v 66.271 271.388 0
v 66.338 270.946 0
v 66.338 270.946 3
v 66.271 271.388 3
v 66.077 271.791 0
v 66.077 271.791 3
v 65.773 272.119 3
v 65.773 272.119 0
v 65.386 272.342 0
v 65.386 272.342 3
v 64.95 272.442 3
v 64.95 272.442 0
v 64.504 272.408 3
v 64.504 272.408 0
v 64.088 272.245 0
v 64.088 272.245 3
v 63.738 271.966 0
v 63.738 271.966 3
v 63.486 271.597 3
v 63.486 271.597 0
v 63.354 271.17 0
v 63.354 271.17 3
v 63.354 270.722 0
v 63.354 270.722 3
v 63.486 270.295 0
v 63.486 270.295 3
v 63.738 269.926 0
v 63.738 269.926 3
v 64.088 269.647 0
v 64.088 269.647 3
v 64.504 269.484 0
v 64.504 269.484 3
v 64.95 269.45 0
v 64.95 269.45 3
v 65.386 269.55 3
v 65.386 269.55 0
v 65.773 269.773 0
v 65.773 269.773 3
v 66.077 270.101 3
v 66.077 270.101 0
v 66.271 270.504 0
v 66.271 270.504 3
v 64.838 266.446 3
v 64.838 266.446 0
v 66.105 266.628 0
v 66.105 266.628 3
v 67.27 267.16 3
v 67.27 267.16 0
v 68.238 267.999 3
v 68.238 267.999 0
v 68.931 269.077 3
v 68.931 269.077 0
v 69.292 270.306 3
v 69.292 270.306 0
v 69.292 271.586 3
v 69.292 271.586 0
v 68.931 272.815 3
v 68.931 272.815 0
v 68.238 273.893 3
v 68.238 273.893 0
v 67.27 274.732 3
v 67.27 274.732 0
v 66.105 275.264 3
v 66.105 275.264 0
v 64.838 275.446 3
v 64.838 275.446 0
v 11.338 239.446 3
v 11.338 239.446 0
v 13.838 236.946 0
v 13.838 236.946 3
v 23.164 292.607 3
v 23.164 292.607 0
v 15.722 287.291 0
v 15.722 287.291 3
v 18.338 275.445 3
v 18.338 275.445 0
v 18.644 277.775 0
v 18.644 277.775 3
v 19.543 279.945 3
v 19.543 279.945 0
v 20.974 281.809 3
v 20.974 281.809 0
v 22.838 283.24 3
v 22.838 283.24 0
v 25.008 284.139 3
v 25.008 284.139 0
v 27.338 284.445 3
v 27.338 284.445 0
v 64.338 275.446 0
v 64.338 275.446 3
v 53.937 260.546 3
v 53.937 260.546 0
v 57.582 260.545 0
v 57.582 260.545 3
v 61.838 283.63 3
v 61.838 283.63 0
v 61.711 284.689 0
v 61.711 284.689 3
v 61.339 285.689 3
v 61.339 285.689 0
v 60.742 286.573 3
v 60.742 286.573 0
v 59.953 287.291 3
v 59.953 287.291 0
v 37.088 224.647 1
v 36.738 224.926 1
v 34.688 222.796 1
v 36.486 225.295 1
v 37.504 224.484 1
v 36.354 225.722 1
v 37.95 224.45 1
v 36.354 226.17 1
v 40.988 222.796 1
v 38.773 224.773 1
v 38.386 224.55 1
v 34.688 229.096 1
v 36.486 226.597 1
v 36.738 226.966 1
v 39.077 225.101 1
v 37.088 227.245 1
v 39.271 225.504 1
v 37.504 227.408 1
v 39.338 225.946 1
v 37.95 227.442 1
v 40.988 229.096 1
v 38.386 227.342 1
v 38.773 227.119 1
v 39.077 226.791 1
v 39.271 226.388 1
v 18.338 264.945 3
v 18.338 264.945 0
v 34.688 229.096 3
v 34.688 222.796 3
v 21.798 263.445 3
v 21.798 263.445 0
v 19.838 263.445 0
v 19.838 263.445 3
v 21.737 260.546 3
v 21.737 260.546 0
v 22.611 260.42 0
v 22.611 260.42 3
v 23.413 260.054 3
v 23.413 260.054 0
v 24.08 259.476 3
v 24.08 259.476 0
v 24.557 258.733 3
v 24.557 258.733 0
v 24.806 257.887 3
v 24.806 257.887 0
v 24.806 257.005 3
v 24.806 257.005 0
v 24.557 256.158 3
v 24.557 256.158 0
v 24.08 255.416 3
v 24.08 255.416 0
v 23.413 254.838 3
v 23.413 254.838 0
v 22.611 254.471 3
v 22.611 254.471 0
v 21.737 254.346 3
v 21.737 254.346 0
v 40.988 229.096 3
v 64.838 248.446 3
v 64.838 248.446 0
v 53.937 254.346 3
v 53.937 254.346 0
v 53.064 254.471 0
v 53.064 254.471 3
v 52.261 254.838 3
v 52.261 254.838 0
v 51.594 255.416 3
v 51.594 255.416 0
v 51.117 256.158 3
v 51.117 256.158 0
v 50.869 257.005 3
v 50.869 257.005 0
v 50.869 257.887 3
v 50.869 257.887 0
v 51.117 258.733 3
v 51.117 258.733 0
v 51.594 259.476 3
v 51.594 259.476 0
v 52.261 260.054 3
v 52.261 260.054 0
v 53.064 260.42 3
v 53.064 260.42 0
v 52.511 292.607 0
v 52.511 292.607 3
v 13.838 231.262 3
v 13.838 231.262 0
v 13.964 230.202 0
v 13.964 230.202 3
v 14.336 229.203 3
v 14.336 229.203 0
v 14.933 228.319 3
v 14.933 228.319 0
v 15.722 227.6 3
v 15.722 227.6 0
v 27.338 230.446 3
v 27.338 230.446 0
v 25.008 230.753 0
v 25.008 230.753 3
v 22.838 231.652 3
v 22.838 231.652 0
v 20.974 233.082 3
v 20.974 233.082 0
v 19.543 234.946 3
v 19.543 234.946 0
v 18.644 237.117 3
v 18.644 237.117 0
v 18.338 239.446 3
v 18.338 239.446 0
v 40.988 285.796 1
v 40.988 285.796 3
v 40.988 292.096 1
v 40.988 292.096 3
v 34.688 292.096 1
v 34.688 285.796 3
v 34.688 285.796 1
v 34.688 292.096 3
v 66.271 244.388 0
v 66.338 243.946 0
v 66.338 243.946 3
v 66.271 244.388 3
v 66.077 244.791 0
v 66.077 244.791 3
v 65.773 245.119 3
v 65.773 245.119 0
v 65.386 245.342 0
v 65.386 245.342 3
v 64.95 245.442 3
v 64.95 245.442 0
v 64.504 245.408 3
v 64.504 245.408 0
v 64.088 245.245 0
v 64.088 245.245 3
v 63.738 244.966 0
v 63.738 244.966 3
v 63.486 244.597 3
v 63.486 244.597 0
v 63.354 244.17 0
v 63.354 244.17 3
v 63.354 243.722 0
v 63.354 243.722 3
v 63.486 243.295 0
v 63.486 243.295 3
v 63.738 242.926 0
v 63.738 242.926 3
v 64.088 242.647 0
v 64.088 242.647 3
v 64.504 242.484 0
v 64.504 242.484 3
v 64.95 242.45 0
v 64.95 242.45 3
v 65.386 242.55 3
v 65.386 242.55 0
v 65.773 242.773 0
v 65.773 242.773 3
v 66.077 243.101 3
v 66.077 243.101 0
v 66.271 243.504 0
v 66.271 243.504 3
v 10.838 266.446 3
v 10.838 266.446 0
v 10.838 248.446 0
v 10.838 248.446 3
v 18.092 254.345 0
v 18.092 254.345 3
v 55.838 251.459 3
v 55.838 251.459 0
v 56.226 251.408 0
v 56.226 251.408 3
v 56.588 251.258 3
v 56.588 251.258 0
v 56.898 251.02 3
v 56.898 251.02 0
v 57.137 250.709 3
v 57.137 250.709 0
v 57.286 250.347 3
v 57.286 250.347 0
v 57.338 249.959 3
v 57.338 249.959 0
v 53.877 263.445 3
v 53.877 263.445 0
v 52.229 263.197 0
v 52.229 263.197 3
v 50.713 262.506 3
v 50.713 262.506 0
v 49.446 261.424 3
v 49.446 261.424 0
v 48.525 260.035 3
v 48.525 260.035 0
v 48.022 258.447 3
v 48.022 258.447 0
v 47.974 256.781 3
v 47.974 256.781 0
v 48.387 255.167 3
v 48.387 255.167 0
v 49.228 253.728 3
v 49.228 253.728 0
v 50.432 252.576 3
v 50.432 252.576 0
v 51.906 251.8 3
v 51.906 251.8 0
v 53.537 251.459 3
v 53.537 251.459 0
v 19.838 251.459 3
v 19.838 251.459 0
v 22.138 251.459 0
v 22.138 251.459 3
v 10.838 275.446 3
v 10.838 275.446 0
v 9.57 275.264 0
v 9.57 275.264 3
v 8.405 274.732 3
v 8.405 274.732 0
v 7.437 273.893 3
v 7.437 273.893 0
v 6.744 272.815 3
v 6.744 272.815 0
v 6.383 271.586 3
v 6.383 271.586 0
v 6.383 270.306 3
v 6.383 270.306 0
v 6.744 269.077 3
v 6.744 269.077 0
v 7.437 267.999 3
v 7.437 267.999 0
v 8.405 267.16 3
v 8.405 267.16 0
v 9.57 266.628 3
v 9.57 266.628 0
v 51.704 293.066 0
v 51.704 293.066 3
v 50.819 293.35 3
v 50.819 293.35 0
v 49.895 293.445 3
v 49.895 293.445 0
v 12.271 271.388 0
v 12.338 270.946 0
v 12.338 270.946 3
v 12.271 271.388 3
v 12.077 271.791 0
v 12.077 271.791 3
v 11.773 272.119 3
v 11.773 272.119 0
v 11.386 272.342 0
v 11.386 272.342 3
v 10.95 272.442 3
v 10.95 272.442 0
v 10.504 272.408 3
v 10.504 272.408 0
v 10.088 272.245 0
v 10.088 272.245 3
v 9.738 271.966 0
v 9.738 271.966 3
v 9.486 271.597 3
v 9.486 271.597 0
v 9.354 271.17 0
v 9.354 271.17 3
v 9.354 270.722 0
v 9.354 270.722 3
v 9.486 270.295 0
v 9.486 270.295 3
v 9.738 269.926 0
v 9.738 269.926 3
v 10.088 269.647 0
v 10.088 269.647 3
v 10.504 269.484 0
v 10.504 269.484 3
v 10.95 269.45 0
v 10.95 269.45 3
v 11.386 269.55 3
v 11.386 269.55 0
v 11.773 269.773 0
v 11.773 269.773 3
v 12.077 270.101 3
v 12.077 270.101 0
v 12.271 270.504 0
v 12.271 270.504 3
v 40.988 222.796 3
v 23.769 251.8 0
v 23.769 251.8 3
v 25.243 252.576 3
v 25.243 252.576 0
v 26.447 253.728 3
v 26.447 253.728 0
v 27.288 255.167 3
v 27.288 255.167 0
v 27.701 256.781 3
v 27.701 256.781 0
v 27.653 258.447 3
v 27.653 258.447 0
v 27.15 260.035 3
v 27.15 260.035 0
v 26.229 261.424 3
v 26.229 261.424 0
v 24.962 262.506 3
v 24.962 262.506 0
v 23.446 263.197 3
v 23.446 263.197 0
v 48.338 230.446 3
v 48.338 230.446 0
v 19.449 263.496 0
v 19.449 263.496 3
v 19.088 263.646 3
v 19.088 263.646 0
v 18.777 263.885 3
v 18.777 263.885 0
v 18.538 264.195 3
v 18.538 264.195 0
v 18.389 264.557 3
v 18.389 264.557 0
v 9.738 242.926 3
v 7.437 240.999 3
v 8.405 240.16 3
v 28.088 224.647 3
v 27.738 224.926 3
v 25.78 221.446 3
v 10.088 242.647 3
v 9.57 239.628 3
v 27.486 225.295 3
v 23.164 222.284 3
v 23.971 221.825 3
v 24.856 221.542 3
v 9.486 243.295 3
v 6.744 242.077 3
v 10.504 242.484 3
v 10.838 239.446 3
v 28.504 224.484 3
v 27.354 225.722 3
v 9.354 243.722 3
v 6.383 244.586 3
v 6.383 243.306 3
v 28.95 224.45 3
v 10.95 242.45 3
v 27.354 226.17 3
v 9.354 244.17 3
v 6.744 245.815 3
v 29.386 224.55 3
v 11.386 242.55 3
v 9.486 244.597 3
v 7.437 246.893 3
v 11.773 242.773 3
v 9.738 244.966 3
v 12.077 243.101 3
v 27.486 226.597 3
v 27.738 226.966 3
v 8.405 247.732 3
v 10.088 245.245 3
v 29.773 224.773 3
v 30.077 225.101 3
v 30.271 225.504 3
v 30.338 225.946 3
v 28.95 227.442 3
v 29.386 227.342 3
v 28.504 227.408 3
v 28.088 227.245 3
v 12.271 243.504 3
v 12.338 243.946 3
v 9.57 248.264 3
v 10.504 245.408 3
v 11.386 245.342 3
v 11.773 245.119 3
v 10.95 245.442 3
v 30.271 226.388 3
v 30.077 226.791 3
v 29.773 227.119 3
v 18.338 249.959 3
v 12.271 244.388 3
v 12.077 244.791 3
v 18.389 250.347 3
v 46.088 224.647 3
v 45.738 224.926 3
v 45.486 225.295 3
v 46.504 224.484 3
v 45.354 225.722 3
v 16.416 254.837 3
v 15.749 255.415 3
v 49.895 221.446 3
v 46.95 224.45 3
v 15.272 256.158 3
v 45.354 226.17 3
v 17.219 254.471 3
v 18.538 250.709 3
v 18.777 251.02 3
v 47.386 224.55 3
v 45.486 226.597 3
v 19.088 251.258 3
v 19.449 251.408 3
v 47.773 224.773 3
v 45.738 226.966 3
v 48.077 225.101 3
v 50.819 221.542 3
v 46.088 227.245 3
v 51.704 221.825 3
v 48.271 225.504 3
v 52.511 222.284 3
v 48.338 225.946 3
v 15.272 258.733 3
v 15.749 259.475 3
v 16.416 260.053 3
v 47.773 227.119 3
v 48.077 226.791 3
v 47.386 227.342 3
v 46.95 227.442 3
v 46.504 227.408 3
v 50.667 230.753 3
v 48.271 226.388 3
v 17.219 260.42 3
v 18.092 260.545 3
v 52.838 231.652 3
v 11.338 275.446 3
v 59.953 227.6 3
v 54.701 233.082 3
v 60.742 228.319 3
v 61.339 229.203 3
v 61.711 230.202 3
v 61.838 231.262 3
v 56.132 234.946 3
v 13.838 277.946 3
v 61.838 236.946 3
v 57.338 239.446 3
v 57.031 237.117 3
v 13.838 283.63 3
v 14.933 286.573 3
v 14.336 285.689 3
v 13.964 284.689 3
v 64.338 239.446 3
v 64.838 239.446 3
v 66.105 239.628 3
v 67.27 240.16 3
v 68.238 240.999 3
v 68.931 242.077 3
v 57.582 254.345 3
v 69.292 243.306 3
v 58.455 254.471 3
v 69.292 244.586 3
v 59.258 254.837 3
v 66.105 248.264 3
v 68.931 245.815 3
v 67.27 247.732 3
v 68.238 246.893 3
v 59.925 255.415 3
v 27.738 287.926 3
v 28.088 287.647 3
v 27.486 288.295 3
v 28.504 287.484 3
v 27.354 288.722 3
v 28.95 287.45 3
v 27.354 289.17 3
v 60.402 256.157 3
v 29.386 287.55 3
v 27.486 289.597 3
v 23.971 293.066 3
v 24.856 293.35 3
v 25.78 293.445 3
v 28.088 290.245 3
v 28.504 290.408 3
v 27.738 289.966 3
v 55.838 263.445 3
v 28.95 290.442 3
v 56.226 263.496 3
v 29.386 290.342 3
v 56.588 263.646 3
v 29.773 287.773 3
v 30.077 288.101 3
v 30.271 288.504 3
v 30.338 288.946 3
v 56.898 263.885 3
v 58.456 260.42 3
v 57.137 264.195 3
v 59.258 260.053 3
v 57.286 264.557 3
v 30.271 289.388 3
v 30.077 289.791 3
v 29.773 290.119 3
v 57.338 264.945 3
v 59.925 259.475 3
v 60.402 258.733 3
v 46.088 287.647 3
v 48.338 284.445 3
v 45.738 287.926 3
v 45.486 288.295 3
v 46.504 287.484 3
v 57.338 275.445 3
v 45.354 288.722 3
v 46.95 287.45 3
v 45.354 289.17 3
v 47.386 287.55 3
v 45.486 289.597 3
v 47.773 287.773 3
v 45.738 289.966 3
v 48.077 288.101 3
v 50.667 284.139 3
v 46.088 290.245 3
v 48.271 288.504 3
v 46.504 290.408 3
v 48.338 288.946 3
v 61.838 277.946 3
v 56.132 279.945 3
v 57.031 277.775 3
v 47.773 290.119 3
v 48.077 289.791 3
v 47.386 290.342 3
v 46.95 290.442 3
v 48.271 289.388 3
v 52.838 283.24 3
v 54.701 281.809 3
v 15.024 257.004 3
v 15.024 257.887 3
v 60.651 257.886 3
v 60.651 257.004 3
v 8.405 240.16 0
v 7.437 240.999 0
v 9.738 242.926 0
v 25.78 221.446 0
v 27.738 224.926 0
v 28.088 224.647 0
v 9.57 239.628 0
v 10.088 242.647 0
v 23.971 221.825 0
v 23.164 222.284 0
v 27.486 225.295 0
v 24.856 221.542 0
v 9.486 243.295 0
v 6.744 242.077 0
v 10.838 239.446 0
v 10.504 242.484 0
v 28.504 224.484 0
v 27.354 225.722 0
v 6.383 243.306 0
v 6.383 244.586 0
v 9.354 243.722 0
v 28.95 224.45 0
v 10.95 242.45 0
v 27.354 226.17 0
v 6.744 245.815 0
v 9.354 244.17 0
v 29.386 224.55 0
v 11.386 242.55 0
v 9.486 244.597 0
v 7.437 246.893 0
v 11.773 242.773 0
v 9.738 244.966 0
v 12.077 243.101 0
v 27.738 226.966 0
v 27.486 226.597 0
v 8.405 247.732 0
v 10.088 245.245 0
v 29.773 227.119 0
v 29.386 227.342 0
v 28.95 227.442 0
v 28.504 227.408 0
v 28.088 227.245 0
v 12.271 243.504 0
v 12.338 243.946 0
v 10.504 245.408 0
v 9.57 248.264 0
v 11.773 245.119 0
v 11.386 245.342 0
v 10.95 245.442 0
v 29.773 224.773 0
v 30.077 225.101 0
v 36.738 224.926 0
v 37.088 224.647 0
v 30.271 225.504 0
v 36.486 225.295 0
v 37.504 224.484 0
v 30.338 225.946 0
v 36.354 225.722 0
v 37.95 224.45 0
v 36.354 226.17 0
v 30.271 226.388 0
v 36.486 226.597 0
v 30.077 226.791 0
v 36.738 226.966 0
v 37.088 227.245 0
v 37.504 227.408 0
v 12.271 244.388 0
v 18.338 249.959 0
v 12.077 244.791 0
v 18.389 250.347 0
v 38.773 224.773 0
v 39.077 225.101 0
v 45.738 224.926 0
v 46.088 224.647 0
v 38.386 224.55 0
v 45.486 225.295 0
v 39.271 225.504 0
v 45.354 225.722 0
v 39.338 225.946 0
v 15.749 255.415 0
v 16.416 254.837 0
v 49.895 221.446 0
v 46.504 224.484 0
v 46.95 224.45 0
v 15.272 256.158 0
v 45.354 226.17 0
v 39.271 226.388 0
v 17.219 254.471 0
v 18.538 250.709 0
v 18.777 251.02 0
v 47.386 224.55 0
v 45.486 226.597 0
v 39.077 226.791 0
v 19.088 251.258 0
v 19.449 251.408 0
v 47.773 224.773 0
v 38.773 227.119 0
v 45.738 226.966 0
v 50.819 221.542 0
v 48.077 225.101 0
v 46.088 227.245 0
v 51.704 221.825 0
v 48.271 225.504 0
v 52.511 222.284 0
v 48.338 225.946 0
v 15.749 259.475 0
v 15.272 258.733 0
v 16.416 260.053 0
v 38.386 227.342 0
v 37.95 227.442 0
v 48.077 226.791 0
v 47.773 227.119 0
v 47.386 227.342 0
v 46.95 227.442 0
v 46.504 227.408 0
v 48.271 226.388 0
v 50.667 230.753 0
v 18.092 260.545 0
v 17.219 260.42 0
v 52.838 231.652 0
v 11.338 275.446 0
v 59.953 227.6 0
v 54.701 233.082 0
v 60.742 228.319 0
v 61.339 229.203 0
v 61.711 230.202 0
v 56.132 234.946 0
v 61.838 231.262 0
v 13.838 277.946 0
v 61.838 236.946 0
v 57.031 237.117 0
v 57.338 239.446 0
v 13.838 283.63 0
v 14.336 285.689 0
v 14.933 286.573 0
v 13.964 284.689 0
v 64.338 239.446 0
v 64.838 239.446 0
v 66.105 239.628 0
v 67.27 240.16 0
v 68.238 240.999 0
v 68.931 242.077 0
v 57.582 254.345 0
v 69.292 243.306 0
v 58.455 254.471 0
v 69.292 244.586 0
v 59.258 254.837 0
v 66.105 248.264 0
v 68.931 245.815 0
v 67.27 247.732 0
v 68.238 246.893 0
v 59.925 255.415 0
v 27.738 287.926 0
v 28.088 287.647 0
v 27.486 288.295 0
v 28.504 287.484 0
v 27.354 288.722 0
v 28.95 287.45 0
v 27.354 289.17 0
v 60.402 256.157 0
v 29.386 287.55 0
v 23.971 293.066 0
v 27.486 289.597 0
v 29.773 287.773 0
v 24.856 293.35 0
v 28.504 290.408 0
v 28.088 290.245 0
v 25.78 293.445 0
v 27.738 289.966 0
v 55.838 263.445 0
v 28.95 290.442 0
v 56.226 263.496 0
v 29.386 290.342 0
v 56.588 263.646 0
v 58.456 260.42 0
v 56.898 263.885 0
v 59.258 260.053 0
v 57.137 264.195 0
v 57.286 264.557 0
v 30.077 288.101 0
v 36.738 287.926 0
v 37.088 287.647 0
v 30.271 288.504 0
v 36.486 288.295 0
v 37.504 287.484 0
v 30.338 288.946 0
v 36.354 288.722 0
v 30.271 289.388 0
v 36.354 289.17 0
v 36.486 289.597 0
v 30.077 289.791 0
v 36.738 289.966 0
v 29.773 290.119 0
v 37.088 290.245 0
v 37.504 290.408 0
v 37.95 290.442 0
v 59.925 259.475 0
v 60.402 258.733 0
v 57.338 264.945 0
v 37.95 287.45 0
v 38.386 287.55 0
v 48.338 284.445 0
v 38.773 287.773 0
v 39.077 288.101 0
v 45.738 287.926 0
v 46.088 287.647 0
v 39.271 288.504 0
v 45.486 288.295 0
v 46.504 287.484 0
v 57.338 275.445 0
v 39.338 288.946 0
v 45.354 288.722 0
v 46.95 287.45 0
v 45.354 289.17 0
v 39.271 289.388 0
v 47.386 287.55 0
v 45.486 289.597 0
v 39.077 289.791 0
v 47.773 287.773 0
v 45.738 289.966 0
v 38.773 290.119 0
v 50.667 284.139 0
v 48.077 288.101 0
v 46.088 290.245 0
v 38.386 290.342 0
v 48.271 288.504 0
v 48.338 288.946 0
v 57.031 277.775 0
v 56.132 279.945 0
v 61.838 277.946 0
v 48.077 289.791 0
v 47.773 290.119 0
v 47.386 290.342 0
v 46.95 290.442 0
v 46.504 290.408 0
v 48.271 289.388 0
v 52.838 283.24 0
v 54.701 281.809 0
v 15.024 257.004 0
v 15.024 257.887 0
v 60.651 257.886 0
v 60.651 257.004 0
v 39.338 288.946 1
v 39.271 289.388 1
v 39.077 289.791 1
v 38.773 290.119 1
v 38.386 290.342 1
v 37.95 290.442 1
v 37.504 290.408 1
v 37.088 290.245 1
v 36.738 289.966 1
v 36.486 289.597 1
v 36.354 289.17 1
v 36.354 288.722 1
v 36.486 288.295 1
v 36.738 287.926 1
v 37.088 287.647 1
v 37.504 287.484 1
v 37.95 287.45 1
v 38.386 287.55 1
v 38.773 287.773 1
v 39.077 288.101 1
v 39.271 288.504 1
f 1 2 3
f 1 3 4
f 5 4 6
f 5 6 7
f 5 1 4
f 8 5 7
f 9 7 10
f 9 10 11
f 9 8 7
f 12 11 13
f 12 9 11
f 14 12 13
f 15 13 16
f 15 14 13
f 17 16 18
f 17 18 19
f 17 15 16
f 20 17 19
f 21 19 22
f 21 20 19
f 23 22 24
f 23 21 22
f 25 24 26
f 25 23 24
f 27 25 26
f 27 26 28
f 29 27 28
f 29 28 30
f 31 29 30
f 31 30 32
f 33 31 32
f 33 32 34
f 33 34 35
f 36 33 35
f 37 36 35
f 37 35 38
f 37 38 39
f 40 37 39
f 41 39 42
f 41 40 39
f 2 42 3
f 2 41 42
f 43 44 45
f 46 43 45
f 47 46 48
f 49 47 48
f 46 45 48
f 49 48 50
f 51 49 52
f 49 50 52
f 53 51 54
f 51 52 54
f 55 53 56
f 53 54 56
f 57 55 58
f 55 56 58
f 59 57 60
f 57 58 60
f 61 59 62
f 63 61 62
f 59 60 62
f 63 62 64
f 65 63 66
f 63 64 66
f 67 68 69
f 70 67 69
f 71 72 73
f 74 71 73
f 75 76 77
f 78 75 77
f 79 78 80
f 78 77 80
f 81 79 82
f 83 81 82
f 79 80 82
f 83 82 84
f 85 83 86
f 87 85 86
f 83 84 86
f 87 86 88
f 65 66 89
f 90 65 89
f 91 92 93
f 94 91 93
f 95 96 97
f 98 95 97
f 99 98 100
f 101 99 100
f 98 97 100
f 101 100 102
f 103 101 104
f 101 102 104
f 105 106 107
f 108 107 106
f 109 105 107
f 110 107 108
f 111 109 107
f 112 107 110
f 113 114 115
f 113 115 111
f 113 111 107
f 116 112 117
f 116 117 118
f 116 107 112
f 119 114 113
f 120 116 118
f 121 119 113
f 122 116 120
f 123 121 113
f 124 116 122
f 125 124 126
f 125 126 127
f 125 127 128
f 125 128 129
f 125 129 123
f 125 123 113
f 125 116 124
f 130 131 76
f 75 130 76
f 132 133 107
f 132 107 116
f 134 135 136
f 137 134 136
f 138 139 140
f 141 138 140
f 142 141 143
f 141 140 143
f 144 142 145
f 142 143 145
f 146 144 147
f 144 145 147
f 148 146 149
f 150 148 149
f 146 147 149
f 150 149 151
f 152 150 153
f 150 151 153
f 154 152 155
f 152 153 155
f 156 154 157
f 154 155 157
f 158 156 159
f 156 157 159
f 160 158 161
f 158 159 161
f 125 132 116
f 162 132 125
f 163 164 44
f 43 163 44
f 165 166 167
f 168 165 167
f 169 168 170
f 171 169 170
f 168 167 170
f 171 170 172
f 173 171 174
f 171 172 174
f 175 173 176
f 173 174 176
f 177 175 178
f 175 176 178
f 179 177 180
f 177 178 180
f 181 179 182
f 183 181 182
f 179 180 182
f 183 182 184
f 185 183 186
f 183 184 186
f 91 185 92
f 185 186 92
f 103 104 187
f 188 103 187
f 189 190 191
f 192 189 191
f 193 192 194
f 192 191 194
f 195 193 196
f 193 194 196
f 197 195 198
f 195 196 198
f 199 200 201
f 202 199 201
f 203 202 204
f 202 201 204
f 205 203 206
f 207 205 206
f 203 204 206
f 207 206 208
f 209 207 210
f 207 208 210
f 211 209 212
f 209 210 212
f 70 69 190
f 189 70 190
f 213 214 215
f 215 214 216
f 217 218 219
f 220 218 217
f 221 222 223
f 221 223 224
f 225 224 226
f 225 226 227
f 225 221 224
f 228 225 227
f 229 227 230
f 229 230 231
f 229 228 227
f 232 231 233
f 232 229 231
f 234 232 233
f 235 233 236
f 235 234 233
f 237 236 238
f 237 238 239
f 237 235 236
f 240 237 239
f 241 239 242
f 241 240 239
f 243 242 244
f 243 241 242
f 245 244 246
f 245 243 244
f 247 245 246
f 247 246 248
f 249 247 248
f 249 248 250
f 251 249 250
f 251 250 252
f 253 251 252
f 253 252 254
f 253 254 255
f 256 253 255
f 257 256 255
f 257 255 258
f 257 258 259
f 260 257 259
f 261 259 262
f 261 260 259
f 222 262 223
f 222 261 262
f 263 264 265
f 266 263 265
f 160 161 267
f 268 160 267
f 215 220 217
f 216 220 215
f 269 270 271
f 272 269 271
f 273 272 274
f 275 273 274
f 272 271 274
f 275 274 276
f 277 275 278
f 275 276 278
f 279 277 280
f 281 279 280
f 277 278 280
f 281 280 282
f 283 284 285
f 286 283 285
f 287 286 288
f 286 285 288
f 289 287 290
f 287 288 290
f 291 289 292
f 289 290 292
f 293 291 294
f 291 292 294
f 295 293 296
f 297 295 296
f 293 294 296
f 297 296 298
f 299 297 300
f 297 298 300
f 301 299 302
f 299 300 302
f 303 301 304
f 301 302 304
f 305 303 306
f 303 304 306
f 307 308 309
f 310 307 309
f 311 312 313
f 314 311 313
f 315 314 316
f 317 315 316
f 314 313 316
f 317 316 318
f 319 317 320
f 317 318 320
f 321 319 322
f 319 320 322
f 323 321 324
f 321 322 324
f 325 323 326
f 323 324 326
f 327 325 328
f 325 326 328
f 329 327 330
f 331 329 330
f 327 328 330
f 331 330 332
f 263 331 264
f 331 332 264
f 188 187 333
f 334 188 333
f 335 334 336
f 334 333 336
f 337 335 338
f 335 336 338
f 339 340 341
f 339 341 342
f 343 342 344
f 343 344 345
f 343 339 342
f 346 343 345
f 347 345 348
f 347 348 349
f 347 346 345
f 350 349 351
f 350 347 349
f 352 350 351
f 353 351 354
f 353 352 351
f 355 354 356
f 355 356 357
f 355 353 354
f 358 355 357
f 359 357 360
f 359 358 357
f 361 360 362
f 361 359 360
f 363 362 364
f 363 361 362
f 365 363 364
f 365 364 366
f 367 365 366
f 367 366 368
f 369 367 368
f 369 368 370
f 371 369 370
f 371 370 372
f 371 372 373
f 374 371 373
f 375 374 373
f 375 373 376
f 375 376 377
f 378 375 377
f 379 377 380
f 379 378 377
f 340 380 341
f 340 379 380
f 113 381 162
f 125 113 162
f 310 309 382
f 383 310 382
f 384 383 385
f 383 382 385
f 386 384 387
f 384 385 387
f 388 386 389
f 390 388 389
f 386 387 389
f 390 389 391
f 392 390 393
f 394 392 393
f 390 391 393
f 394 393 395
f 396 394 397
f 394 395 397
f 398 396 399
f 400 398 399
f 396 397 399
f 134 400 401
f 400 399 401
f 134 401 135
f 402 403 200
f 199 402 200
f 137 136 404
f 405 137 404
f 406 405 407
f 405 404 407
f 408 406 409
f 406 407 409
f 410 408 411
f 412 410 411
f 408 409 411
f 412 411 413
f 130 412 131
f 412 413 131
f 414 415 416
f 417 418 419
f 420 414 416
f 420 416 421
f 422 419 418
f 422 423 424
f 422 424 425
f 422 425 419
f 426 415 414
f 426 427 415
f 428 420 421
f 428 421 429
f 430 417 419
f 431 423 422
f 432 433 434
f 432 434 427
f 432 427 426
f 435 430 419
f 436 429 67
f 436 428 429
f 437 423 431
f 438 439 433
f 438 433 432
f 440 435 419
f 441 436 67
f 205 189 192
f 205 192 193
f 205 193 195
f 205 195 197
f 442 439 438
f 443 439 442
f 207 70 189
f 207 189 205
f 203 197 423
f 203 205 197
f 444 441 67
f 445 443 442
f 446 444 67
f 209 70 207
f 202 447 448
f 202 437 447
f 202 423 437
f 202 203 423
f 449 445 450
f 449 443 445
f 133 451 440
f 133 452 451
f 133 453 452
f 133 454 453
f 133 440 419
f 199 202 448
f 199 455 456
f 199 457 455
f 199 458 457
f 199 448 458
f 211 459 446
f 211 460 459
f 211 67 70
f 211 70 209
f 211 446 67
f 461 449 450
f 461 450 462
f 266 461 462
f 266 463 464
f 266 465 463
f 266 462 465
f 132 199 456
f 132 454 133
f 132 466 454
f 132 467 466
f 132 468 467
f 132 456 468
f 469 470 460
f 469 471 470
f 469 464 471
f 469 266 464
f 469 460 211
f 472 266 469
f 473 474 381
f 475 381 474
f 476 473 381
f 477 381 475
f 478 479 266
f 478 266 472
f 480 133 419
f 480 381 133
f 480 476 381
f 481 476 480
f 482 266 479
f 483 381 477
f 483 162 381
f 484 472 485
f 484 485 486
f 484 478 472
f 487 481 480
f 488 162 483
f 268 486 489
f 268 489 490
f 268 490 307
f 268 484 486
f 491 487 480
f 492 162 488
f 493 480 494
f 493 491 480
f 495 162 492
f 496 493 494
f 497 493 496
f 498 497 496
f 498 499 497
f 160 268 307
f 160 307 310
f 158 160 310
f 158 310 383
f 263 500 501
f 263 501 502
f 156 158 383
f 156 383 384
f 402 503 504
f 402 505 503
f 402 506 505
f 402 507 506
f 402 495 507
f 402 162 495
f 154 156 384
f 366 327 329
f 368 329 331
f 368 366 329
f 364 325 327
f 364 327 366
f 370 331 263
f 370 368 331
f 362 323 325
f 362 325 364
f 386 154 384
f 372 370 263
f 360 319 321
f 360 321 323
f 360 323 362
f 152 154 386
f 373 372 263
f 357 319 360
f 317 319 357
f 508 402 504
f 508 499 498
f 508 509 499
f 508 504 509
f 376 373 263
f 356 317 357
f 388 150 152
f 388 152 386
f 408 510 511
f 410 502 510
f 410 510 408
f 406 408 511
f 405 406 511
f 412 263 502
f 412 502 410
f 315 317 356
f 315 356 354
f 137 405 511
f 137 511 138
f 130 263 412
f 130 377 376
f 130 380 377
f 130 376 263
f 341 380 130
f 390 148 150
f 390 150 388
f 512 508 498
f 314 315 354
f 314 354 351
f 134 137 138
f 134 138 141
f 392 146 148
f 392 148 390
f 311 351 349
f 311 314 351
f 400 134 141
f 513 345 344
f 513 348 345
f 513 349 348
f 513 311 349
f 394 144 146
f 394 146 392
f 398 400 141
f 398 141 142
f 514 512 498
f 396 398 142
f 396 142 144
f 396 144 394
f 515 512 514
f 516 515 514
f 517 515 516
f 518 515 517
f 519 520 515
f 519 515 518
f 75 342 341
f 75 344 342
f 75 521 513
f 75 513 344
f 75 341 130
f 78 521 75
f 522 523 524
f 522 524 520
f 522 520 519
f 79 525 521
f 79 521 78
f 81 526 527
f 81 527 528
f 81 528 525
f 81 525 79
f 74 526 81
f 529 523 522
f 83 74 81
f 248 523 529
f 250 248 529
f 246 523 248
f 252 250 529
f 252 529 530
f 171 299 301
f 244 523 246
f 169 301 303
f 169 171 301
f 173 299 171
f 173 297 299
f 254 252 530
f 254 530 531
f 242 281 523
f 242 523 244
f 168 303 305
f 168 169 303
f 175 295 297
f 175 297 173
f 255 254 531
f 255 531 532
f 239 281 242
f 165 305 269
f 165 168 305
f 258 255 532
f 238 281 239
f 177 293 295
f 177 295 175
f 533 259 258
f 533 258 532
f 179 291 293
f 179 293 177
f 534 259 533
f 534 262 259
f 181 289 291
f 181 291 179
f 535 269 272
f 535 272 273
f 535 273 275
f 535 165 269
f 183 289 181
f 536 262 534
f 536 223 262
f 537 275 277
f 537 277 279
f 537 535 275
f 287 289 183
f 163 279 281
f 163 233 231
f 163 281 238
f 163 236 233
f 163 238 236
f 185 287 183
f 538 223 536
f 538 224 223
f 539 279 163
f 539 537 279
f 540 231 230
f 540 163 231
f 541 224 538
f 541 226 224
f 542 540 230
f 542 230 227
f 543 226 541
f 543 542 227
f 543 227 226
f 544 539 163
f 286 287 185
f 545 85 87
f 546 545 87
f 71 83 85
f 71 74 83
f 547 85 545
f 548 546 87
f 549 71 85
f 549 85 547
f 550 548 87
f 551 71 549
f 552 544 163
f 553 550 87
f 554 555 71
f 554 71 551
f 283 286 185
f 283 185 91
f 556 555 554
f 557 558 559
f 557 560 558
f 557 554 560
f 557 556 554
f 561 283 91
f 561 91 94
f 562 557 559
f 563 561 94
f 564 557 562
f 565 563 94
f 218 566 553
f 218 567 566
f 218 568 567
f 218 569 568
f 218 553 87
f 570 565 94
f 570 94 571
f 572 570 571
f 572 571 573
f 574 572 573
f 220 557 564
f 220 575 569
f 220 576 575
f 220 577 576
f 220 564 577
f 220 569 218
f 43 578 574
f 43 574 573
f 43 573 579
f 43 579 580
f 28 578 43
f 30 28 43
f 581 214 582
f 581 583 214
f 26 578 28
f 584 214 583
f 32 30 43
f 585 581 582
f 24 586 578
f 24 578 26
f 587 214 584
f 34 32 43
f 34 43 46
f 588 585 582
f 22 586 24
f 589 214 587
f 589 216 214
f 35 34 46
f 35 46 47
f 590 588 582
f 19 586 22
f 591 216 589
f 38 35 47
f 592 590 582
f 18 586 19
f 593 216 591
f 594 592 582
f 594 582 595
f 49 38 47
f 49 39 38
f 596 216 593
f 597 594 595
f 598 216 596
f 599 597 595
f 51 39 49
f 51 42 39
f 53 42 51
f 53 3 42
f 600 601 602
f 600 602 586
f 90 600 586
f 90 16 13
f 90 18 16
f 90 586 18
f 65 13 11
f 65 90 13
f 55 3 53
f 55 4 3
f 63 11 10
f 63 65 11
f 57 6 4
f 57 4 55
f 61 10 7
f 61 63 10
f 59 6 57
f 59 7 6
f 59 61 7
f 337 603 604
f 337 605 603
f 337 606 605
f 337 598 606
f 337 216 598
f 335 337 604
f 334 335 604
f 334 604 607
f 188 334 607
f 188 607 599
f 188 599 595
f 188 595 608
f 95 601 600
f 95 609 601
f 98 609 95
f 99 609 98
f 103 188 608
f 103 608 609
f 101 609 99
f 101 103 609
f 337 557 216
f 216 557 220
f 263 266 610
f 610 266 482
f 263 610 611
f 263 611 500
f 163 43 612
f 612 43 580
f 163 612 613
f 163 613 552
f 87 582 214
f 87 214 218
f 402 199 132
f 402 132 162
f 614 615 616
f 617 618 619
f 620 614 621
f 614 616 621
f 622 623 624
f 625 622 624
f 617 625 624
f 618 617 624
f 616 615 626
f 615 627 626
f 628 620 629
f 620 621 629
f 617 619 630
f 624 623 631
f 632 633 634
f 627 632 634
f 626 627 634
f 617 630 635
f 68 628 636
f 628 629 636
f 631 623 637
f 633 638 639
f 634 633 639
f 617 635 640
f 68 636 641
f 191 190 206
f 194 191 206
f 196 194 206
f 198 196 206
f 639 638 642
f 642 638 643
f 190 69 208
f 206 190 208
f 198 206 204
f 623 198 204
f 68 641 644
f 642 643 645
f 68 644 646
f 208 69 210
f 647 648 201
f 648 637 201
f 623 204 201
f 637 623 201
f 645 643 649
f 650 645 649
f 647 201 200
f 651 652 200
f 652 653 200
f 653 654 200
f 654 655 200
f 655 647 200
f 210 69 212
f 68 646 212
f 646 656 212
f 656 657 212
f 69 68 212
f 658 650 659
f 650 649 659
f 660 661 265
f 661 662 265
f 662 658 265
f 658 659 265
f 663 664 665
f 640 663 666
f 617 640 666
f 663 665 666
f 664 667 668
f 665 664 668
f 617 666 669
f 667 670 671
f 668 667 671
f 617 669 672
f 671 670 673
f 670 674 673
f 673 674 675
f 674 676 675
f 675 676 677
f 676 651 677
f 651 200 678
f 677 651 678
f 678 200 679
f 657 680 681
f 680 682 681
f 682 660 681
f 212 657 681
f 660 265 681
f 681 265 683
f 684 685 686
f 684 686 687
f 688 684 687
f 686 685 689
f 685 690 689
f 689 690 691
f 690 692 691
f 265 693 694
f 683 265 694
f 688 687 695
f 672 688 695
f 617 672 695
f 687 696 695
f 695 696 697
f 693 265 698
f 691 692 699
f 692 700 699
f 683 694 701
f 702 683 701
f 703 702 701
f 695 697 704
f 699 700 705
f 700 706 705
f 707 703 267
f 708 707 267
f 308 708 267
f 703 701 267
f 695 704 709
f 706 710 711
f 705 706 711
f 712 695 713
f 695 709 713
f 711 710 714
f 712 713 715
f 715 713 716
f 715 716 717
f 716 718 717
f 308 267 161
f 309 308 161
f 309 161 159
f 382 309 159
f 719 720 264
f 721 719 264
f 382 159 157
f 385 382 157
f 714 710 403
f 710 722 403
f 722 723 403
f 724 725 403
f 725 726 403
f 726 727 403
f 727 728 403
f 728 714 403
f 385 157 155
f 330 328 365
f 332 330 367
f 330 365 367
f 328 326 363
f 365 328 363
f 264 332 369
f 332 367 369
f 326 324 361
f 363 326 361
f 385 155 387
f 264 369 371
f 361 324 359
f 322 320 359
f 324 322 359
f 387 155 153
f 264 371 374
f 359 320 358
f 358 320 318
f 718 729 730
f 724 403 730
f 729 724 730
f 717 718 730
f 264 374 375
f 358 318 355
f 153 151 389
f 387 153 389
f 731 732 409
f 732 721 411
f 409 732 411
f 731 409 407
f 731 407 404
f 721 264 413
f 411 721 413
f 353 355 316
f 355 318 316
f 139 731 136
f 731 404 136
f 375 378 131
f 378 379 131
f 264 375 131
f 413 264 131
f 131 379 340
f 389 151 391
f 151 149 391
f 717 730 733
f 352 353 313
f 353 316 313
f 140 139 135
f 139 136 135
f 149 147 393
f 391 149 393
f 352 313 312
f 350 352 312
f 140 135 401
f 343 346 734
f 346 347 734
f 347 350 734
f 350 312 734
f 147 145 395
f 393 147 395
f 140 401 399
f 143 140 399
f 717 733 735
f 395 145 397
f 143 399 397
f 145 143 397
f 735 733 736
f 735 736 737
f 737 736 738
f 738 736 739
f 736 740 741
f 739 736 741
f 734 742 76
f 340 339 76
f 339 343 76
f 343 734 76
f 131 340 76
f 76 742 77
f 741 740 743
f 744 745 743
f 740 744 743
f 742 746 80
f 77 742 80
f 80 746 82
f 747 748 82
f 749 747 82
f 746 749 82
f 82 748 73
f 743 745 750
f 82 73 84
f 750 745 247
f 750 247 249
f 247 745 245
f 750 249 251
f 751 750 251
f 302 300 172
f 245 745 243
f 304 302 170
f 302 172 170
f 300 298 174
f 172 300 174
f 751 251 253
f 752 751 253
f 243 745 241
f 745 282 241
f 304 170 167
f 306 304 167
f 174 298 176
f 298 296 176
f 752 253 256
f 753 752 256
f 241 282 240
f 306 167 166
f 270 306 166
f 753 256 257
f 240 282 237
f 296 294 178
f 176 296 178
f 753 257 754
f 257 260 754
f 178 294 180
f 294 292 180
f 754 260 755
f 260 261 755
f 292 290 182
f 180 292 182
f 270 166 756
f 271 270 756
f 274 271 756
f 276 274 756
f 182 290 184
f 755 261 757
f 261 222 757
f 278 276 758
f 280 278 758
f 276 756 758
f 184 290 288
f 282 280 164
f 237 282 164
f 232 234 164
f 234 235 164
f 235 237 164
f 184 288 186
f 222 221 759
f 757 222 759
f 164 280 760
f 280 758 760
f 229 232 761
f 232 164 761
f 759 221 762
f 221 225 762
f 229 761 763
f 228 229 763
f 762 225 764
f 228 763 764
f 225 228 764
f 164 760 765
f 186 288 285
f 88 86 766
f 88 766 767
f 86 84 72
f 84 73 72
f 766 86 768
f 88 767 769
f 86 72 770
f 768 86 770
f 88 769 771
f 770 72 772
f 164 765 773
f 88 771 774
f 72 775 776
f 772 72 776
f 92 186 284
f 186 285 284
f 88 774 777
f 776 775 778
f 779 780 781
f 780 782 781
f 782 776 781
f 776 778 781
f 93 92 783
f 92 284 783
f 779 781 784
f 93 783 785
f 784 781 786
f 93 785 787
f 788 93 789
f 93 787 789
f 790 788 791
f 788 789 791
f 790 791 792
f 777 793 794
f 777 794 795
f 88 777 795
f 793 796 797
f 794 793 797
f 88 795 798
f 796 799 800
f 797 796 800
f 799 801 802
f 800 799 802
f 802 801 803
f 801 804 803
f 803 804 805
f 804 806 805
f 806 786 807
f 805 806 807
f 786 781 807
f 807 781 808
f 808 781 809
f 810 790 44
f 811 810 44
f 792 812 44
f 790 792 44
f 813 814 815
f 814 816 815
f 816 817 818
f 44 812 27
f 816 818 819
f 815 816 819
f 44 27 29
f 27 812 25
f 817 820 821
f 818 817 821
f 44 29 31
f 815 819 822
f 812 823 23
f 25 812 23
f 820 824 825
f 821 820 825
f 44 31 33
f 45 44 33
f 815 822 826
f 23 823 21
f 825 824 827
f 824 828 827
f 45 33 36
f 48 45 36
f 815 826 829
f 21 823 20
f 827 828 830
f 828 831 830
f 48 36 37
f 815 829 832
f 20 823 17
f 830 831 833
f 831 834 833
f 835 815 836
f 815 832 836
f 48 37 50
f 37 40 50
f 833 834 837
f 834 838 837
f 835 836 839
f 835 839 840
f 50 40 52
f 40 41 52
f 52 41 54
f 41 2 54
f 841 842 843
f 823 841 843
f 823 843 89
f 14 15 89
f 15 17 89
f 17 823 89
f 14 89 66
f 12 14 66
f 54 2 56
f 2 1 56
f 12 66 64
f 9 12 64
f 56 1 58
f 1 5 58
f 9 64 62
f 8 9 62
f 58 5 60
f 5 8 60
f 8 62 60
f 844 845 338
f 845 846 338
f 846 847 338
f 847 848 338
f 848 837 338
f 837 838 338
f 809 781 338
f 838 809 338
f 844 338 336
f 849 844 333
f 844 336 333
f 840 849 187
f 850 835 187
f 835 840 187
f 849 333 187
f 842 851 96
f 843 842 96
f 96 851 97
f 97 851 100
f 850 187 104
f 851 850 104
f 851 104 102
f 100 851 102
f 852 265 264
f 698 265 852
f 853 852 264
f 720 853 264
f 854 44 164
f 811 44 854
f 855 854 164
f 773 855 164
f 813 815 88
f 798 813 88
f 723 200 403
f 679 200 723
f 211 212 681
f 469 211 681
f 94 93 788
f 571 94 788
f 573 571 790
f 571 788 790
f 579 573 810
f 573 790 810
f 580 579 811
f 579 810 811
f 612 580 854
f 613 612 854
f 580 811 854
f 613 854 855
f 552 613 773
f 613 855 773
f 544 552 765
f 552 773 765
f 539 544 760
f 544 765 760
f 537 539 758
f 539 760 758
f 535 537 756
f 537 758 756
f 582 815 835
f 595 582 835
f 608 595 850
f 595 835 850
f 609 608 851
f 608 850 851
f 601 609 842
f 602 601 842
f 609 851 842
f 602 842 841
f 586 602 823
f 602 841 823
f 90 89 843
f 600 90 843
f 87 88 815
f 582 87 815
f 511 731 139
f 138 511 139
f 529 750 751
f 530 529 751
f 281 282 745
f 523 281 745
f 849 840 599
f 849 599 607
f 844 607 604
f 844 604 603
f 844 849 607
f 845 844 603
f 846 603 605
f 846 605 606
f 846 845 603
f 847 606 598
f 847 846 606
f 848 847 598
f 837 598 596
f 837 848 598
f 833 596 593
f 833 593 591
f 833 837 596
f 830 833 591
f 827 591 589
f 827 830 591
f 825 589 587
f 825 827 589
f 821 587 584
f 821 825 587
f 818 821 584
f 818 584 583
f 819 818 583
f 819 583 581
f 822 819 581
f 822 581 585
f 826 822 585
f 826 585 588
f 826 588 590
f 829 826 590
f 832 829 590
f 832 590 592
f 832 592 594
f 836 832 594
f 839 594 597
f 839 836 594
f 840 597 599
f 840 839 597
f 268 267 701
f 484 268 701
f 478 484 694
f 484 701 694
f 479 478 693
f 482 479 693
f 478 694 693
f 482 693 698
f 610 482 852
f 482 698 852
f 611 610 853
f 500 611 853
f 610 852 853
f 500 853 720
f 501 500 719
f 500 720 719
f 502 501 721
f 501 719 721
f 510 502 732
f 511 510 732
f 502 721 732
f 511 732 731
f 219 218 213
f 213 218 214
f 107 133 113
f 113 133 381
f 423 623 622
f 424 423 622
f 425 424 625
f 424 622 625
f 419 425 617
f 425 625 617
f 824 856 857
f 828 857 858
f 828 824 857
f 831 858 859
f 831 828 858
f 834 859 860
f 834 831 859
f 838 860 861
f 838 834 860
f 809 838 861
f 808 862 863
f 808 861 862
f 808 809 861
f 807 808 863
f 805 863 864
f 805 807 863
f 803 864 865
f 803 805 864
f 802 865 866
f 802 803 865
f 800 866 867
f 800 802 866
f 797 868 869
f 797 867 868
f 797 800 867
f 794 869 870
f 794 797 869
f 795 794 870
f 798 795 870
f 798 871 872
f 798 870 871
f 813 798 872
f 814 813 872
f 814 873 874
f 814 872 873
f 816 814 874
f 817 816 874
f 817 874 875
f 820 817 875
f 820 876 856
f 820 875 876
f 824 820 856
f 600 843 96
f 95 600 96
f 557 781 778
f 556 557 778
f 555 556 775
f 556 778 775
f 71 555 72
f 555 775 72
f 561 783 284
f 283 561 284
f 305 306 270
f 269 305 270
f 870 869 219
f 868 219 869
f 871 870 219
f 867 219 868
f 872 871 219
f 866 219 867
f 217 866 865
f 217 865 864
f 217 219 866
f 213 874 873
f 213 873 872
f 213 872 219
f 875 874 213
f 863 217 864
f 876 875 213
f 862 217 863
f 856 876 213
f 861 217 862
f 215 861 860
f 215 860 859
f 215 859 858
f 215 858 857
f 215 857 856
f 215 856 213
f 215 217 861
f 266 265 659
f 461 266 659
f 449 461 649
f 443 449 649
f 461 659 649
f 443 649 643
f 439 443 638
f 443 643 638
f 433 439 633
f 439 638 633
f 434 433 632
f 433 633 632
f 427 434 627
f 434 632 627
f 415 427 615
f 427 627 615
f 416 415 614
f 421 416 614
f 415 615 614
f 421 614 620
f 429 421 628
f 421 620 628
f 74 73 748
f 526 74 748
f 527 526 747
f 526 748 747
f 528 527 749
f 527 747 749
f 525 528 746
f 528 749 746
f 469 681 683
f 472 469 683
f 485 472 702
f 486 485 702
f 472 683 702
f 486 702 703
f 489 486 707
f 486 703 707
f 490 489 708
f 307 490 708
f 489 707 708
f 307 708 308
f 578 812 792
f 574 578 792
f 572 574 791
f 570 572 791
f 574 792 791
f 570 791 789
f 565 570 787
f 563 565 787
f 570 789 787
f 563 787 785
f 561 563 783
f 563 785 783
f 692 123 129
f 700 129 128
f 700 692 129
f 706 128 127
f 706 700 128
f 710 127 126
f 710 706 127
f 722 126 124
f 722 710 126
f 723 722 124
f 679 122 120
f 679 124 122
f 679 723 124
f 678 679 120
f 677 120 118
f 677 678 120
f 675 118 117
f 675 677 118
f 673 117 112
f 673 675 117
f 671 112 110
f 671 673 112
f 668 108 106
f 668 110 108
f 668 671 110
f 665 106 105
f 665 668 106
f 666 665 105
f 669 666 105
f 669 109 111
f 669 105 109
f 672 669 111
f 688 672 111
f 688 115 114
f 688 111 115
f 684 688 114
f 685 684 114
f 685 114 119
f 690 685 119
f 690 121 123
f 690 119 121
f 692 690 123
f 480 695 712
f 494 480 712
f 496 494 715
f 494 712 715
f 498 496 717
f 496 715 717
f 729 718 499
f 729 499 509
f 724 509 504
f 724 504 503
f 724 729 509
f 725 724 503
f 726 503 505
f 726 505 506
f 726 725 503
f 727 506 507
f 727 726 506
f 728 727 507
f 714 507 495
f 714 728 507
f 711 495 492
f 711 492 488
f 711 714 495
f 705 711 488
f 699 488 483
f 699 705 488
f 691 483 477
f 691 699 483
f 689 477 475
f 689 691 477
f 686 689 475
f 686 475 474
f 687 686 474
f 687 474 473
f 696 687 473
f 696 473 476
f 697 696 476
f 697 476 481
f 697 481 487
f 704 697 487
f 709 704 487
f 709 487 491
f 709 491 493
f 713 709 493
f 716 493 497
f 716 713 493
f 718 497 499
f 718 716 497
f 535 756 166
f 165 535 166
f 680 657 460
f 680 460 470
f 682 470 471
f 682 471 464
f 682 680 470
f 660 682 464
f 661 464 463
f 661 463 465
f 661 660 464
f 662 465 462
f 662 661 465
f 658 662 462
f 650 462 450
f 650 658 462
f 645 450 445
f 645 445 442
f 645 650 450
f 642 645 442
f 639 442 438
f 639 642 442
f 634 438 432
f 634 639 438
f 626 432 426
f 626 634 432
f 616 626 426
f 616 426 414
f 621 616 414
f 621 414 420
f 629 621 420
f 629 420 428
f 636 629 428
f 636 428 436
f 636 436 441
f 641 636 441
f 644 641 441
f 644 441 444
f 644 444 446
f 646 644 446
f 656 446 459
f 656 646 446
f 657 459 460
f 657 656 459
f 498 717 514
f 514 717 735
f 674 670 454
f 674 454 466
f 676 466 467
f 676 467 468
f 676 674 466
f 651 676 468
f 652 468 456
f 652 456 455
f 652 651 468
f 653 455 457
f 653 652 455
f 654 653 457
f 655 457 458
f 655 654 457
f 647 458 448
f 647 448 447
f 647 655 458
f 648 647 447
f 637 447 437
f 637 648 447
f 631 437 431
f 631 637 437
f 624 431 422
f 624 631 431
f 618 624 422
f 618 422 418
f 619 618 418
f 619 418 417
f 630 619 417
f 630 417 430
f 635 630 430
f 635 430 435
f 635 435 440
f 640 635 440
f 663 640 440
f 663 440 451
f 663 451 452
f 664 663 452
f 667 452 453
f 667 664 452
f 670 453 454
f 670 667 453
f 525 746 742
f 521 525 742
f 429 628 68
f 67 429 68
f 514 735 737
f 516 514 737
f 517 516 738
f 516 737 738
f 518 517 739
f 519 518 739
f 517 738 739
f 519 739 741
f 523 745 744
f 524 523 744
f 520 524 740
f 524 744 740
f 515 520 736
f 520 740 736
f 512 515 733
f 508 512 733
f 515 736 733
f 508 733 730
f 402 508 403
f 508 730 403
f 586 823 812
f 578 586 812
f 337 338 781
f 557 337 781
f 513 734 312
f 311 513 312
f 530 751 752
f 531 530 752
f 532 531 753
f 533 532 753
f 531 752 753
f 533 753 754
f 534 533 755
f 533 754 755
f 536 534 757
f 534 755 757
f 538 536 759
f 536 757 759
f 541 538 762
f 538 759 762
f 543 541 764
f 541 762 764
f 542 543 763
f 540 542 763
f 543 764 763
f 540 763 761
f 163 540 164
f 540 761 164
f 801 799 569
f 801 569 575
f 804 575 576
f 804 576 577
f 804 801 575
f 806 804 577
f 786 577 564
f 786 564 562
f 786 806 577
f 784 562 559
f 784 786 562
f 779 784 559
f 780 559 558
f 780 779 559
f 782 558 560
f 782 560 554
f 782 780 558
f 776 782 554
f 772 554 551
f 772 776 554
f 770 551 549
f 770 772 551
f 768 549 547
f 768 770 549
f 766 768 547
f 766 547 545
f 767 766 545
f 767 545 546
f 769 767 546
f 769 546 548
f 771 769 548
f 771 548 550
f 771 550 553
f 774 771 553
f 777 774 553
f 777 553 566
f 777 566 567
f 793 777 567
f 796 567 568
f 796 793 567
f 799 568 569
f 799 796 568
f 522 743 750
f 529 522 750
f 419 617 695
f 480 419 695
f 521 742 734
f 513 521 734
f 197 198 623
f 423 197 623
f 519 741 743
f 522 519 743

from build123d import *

# Parameters (mm, degrees)
MODEL_R                 = 1.5
SALIENTE_EXTRUIR1_DEPTH = 3
CROQUIS1_W              = 6.3
CROQUIS1_H              = 6.3
CORTAR_EXTRUIR1_DEPTH   = 2


with BuildPart() as part:
    # Model → Saliente-Extruir1 (new body)
    with BuildSketch(Plane.XY):
        with BuildLine():
            Line((64.337531364, 275.445982488), (61.837531364, 277.945982488))
            Line((61.837531364, 277.945982488), (61.837531364, 283.629591549))
            ThreePointArc((61.837531364, 283.629591549), (61.338785756, 285.688708663), (59.953103236, 287.29139217))
            Line((59.953103236, 287.29139217), (52.511010495, 292.607172698))
            ThreePointArc((52.511010495, 292.607172698), (51.268737063, 293.230701866), (49.895438624, 293.445372078))
            Line((49.895438624, 293.445372078), (25.779624104, 293.445372078))
            ThreePointArc((25.779624104, 293.445372078), (24.406325665, 293.230701866), (23.164052233, 292.607172698))
            Line((23.164052233, 292.607172698), (15.721959492, 287.29139217))
            ThreePointArc((15.721959492, 287.29139217), (14.336276972, 285.688708663), (13.837531364, 283.629591549))
            Line((13.837531364, 283.629591549), (13.837531364, 277.945982488))
            Line((13.837531364, 277.945982488), (11.337531364, 275.445982488))
            Line((11.337531364, 275.445982488), (10.837531364, 275.445982488))
            ThreePointArc((10.837531364, 275.445982488), (6.337531364, 270.945982488), (10.837531364, 266.445982488))
            Line((10.837531364, 266.445982488), (10.837531364, 248.445982488))
            ThreePointArc((10.837531364, 248.445982488), (6.337531364, 243.945982488), (10.837531364, 239.445982488))
            Line((10.837531364, 239.445982488), (11.337531364, 239.445982488))
            Line((11.337531364, 239.445982488), (13.837531364, 236.945982488))
            Line((13.837531364, 236.945982488), (13.837531364, 231.261763016))
            ThreePointArc((13.837531364, 231.261763016), (14.336276972, 229.202645903), (15.721959492, 227.599962396))
            Line((15.721959492, 227.599962396), (23.164052233, 222.284181867))
            ThreePointArc((23.164052233, 222.284181867), (24.406325665, 221.660652699), (25.779624104, 221.445982488))
            Line((25.779624104, 221.445982488), (49.895438624, 221.445982488))
            ThreePointArc((49.895438624, 221.445982488), (51.268737063, 221.660652699), (52.511010495, 222.284181867))
            Line((52.511010495, 222.284181867), (59.953103236, 227.599962396))
            ThreePointArc((59.953103236, 227.599962396), (61.338785756, 229.202645903), (61.837531364, 231.261763016))
            Line((61.837531364, 231.261763016), (61.837531364, 236.945982488))
            Line((61.837531364, 236.945982488), (64.337531364, 239.445982488))
            Line((64.337531364, 239.445982488), (64.837531364, 239.445982488))
            ThreePointArc((64.837531364, 239.445982488), (69.337531364, 243.945982488), (64.837531364, 248.445982488))
            Line((64.837531364, 248.445982488), (64.837531364, 266.445982488))
            ThreePointArc((64.837531364, 266.445982488), (69.337531364, 270.945982488), (64.837531364, 275.445982488))
            Line((64.837531364, 275.445982488), (64.337531364, 275.445982488))
        make_face()
        with Locations((28.837531364, 225.945982488)):
            Circle(MODEL_R, mode=Mode.SUBTRACT)
        with Locations((10.837531364, 243.945982488)):
            Circle(MODEL_R, mode=Mode.SUBTRACT)
        with BuildLine():
            ThreePointArc((18.092271793, 254.345372089), (14.992271793, 257.445372089), (18.092271793, 260.545372089))
            Line((18.092271793, 260.545372089), (21.737271793, 260.545677294))
            ThreePointArc((21.737271793, 260.545677294), (24.837271793, 257.445677294), (21.737271793, 254.345677294))
            Line((21.737271793, 254.345677294), (18.092271793, 254.345372089))
        make_face(mode=Mode.SUBTRACT)
        with Locations((37.837531364, 225.945982488)):
            Circle(MODEL_R, mode=Mode.SUBTRACT)
        with Locations((46.837531364, 225.945982488)):
            Circle(MODEL_R, mode=Mode.SUBTRACT)
        with Locations((64.837531364, 243.945982488)):
            Circle(MODEL_R, mode=Mode.SUBTRACT)
        with BuildLine():
            ThreePointArc((53.937271793, 254.345677294), (50.837271793, 257.445677294), (53.937271793, 260.545677294))
            Line((53.937271793, 260.545677294), (57.582271793, 260.545372089))
            ThreePointArc((57.582271793, 260.545372089), (60.682141998, 257.445242304), (57.582012214, 254.3453721))
            Line((57.582012214, 254.3453721), (53.937271793, 254.345677294))
        make_face(mode=Mode.SUBTRACT)
        with Locations((10.837531364, 270.945982488)):
            Circle(MODEL_R, mode=Mode.SUBTRACT)
        with Locations((28.837531364, 288.945982488)):
            Circle(MODEL_R, mode=Mode.SUBTRACT)
        with BuildLine():
            Line((18.337531364, 264.945372078), (18.337531364, 275.445372078))
            ThreePointArc((18.337531364, 275.445372078), (20.973570333, 281.809333109), (27.337531364, 284.445372078))
            Line((27.337531364, 284.445372078), (48.337531364, 284.445372078))
            ThreePointArc((48.337531364, 284.445372078), (54.701492395, 281.809333109), (57.337531364, 275.445372078))
            Line((57.337531364, 275.445372078), (57.337531364, 264.945372078))
            ThreePointArc((57.337531364, 264.945372078), (56.898191536, 263.884711906), (55.837531364, 263.445372078))
            Line((55.837531364, 263.445372078), (53.998048837, 263.445372078))
            Line((53.998048837, 263.445372078), (53.877013891, 263.445372078))
            ThreePointArc((53.877013891, 263.445372078), (47.939939639, 257.615658143), (53.537303053, 251.459040723))
            Line((53.537303053, 251.459040723), (55.837531364, 251.459040723))
            ThreePointArc((55.837531364, 251.459040723), (56.898191536, 251.019700895), (57.337531364, 249.959040723))
            Line((57.337531364, 249.959040723), (57.337531364, 239.445982488))
            ThreePointArc((57.337531364, 239.445982488), (54.701492395, 233.082021457), (48.337531364, 230.445982488))
            Line((48.337531364, 230.445982488), (27.337531364, 230.445982488))
            ThreePointArc((27.337531364, 230.445982488), (20.973570333, 233.082021457), (18.337531364, 239.445982488))
            Line((18.337531364, 239.445982488), (18.337531364, 249.959040723))
            ThreePointArc((18.337531364, 249.959040723), (18.776871192, 251.019700895), (19.837531364, 251.459040723))
            Line((19.837531364, 251.459040723), (22.137759676, 251.459040723))
            ThreePointArc((22.137759676, 251.459040723), (27.735123089, 257.615658143), (21.798048837, 263.445372078))
            Line((21.798048837, 263.445372078), (21.677013891, 263.445372078))
            Line((21.677013891, 263.445372078), (19.837531364, 263.445372078))
            ThreePointArc((19.837531364, 263.445372078), (18.776871192, 263.884711906), (18.337531364, 264.945372078))
        make_face(mode=Mode.SUBTRACT)
        with Locations((64.837531364, 270.945982488)):
            Circle(MODEL_R, mode=Mode.SUBTRACT)
        with Locations((37.837531364, 288.945982488)):
            Circle(MODEL_R, mode=Mode.SUBTRACT)
        with Locations((46.837531364, 288.945982488)):
            Circle(MODEL_R, mode=Mode.SUBTRACT)
    extrude(amount=SALIENTE_EXTRUIR1_DEPTH)

    # Croquis1 → Cortar-Extruir1 (cut)
    with BuildSketch(Plane.XY.offset(3)):
        with Locations((37.837531364, 288.945982488)):
            Rectangle(CROQUIS1_W, CROQUIS1_H)
        with Locations((37.837531364, 225.945982488)):
            Rectangle(CROQUIS1_W, CROQUIS1_H)
    extrude(amount=-CORTAR_EXTRUIR1_DEPTH, mode=Mode.SUBTRACT)


solid = part.part
